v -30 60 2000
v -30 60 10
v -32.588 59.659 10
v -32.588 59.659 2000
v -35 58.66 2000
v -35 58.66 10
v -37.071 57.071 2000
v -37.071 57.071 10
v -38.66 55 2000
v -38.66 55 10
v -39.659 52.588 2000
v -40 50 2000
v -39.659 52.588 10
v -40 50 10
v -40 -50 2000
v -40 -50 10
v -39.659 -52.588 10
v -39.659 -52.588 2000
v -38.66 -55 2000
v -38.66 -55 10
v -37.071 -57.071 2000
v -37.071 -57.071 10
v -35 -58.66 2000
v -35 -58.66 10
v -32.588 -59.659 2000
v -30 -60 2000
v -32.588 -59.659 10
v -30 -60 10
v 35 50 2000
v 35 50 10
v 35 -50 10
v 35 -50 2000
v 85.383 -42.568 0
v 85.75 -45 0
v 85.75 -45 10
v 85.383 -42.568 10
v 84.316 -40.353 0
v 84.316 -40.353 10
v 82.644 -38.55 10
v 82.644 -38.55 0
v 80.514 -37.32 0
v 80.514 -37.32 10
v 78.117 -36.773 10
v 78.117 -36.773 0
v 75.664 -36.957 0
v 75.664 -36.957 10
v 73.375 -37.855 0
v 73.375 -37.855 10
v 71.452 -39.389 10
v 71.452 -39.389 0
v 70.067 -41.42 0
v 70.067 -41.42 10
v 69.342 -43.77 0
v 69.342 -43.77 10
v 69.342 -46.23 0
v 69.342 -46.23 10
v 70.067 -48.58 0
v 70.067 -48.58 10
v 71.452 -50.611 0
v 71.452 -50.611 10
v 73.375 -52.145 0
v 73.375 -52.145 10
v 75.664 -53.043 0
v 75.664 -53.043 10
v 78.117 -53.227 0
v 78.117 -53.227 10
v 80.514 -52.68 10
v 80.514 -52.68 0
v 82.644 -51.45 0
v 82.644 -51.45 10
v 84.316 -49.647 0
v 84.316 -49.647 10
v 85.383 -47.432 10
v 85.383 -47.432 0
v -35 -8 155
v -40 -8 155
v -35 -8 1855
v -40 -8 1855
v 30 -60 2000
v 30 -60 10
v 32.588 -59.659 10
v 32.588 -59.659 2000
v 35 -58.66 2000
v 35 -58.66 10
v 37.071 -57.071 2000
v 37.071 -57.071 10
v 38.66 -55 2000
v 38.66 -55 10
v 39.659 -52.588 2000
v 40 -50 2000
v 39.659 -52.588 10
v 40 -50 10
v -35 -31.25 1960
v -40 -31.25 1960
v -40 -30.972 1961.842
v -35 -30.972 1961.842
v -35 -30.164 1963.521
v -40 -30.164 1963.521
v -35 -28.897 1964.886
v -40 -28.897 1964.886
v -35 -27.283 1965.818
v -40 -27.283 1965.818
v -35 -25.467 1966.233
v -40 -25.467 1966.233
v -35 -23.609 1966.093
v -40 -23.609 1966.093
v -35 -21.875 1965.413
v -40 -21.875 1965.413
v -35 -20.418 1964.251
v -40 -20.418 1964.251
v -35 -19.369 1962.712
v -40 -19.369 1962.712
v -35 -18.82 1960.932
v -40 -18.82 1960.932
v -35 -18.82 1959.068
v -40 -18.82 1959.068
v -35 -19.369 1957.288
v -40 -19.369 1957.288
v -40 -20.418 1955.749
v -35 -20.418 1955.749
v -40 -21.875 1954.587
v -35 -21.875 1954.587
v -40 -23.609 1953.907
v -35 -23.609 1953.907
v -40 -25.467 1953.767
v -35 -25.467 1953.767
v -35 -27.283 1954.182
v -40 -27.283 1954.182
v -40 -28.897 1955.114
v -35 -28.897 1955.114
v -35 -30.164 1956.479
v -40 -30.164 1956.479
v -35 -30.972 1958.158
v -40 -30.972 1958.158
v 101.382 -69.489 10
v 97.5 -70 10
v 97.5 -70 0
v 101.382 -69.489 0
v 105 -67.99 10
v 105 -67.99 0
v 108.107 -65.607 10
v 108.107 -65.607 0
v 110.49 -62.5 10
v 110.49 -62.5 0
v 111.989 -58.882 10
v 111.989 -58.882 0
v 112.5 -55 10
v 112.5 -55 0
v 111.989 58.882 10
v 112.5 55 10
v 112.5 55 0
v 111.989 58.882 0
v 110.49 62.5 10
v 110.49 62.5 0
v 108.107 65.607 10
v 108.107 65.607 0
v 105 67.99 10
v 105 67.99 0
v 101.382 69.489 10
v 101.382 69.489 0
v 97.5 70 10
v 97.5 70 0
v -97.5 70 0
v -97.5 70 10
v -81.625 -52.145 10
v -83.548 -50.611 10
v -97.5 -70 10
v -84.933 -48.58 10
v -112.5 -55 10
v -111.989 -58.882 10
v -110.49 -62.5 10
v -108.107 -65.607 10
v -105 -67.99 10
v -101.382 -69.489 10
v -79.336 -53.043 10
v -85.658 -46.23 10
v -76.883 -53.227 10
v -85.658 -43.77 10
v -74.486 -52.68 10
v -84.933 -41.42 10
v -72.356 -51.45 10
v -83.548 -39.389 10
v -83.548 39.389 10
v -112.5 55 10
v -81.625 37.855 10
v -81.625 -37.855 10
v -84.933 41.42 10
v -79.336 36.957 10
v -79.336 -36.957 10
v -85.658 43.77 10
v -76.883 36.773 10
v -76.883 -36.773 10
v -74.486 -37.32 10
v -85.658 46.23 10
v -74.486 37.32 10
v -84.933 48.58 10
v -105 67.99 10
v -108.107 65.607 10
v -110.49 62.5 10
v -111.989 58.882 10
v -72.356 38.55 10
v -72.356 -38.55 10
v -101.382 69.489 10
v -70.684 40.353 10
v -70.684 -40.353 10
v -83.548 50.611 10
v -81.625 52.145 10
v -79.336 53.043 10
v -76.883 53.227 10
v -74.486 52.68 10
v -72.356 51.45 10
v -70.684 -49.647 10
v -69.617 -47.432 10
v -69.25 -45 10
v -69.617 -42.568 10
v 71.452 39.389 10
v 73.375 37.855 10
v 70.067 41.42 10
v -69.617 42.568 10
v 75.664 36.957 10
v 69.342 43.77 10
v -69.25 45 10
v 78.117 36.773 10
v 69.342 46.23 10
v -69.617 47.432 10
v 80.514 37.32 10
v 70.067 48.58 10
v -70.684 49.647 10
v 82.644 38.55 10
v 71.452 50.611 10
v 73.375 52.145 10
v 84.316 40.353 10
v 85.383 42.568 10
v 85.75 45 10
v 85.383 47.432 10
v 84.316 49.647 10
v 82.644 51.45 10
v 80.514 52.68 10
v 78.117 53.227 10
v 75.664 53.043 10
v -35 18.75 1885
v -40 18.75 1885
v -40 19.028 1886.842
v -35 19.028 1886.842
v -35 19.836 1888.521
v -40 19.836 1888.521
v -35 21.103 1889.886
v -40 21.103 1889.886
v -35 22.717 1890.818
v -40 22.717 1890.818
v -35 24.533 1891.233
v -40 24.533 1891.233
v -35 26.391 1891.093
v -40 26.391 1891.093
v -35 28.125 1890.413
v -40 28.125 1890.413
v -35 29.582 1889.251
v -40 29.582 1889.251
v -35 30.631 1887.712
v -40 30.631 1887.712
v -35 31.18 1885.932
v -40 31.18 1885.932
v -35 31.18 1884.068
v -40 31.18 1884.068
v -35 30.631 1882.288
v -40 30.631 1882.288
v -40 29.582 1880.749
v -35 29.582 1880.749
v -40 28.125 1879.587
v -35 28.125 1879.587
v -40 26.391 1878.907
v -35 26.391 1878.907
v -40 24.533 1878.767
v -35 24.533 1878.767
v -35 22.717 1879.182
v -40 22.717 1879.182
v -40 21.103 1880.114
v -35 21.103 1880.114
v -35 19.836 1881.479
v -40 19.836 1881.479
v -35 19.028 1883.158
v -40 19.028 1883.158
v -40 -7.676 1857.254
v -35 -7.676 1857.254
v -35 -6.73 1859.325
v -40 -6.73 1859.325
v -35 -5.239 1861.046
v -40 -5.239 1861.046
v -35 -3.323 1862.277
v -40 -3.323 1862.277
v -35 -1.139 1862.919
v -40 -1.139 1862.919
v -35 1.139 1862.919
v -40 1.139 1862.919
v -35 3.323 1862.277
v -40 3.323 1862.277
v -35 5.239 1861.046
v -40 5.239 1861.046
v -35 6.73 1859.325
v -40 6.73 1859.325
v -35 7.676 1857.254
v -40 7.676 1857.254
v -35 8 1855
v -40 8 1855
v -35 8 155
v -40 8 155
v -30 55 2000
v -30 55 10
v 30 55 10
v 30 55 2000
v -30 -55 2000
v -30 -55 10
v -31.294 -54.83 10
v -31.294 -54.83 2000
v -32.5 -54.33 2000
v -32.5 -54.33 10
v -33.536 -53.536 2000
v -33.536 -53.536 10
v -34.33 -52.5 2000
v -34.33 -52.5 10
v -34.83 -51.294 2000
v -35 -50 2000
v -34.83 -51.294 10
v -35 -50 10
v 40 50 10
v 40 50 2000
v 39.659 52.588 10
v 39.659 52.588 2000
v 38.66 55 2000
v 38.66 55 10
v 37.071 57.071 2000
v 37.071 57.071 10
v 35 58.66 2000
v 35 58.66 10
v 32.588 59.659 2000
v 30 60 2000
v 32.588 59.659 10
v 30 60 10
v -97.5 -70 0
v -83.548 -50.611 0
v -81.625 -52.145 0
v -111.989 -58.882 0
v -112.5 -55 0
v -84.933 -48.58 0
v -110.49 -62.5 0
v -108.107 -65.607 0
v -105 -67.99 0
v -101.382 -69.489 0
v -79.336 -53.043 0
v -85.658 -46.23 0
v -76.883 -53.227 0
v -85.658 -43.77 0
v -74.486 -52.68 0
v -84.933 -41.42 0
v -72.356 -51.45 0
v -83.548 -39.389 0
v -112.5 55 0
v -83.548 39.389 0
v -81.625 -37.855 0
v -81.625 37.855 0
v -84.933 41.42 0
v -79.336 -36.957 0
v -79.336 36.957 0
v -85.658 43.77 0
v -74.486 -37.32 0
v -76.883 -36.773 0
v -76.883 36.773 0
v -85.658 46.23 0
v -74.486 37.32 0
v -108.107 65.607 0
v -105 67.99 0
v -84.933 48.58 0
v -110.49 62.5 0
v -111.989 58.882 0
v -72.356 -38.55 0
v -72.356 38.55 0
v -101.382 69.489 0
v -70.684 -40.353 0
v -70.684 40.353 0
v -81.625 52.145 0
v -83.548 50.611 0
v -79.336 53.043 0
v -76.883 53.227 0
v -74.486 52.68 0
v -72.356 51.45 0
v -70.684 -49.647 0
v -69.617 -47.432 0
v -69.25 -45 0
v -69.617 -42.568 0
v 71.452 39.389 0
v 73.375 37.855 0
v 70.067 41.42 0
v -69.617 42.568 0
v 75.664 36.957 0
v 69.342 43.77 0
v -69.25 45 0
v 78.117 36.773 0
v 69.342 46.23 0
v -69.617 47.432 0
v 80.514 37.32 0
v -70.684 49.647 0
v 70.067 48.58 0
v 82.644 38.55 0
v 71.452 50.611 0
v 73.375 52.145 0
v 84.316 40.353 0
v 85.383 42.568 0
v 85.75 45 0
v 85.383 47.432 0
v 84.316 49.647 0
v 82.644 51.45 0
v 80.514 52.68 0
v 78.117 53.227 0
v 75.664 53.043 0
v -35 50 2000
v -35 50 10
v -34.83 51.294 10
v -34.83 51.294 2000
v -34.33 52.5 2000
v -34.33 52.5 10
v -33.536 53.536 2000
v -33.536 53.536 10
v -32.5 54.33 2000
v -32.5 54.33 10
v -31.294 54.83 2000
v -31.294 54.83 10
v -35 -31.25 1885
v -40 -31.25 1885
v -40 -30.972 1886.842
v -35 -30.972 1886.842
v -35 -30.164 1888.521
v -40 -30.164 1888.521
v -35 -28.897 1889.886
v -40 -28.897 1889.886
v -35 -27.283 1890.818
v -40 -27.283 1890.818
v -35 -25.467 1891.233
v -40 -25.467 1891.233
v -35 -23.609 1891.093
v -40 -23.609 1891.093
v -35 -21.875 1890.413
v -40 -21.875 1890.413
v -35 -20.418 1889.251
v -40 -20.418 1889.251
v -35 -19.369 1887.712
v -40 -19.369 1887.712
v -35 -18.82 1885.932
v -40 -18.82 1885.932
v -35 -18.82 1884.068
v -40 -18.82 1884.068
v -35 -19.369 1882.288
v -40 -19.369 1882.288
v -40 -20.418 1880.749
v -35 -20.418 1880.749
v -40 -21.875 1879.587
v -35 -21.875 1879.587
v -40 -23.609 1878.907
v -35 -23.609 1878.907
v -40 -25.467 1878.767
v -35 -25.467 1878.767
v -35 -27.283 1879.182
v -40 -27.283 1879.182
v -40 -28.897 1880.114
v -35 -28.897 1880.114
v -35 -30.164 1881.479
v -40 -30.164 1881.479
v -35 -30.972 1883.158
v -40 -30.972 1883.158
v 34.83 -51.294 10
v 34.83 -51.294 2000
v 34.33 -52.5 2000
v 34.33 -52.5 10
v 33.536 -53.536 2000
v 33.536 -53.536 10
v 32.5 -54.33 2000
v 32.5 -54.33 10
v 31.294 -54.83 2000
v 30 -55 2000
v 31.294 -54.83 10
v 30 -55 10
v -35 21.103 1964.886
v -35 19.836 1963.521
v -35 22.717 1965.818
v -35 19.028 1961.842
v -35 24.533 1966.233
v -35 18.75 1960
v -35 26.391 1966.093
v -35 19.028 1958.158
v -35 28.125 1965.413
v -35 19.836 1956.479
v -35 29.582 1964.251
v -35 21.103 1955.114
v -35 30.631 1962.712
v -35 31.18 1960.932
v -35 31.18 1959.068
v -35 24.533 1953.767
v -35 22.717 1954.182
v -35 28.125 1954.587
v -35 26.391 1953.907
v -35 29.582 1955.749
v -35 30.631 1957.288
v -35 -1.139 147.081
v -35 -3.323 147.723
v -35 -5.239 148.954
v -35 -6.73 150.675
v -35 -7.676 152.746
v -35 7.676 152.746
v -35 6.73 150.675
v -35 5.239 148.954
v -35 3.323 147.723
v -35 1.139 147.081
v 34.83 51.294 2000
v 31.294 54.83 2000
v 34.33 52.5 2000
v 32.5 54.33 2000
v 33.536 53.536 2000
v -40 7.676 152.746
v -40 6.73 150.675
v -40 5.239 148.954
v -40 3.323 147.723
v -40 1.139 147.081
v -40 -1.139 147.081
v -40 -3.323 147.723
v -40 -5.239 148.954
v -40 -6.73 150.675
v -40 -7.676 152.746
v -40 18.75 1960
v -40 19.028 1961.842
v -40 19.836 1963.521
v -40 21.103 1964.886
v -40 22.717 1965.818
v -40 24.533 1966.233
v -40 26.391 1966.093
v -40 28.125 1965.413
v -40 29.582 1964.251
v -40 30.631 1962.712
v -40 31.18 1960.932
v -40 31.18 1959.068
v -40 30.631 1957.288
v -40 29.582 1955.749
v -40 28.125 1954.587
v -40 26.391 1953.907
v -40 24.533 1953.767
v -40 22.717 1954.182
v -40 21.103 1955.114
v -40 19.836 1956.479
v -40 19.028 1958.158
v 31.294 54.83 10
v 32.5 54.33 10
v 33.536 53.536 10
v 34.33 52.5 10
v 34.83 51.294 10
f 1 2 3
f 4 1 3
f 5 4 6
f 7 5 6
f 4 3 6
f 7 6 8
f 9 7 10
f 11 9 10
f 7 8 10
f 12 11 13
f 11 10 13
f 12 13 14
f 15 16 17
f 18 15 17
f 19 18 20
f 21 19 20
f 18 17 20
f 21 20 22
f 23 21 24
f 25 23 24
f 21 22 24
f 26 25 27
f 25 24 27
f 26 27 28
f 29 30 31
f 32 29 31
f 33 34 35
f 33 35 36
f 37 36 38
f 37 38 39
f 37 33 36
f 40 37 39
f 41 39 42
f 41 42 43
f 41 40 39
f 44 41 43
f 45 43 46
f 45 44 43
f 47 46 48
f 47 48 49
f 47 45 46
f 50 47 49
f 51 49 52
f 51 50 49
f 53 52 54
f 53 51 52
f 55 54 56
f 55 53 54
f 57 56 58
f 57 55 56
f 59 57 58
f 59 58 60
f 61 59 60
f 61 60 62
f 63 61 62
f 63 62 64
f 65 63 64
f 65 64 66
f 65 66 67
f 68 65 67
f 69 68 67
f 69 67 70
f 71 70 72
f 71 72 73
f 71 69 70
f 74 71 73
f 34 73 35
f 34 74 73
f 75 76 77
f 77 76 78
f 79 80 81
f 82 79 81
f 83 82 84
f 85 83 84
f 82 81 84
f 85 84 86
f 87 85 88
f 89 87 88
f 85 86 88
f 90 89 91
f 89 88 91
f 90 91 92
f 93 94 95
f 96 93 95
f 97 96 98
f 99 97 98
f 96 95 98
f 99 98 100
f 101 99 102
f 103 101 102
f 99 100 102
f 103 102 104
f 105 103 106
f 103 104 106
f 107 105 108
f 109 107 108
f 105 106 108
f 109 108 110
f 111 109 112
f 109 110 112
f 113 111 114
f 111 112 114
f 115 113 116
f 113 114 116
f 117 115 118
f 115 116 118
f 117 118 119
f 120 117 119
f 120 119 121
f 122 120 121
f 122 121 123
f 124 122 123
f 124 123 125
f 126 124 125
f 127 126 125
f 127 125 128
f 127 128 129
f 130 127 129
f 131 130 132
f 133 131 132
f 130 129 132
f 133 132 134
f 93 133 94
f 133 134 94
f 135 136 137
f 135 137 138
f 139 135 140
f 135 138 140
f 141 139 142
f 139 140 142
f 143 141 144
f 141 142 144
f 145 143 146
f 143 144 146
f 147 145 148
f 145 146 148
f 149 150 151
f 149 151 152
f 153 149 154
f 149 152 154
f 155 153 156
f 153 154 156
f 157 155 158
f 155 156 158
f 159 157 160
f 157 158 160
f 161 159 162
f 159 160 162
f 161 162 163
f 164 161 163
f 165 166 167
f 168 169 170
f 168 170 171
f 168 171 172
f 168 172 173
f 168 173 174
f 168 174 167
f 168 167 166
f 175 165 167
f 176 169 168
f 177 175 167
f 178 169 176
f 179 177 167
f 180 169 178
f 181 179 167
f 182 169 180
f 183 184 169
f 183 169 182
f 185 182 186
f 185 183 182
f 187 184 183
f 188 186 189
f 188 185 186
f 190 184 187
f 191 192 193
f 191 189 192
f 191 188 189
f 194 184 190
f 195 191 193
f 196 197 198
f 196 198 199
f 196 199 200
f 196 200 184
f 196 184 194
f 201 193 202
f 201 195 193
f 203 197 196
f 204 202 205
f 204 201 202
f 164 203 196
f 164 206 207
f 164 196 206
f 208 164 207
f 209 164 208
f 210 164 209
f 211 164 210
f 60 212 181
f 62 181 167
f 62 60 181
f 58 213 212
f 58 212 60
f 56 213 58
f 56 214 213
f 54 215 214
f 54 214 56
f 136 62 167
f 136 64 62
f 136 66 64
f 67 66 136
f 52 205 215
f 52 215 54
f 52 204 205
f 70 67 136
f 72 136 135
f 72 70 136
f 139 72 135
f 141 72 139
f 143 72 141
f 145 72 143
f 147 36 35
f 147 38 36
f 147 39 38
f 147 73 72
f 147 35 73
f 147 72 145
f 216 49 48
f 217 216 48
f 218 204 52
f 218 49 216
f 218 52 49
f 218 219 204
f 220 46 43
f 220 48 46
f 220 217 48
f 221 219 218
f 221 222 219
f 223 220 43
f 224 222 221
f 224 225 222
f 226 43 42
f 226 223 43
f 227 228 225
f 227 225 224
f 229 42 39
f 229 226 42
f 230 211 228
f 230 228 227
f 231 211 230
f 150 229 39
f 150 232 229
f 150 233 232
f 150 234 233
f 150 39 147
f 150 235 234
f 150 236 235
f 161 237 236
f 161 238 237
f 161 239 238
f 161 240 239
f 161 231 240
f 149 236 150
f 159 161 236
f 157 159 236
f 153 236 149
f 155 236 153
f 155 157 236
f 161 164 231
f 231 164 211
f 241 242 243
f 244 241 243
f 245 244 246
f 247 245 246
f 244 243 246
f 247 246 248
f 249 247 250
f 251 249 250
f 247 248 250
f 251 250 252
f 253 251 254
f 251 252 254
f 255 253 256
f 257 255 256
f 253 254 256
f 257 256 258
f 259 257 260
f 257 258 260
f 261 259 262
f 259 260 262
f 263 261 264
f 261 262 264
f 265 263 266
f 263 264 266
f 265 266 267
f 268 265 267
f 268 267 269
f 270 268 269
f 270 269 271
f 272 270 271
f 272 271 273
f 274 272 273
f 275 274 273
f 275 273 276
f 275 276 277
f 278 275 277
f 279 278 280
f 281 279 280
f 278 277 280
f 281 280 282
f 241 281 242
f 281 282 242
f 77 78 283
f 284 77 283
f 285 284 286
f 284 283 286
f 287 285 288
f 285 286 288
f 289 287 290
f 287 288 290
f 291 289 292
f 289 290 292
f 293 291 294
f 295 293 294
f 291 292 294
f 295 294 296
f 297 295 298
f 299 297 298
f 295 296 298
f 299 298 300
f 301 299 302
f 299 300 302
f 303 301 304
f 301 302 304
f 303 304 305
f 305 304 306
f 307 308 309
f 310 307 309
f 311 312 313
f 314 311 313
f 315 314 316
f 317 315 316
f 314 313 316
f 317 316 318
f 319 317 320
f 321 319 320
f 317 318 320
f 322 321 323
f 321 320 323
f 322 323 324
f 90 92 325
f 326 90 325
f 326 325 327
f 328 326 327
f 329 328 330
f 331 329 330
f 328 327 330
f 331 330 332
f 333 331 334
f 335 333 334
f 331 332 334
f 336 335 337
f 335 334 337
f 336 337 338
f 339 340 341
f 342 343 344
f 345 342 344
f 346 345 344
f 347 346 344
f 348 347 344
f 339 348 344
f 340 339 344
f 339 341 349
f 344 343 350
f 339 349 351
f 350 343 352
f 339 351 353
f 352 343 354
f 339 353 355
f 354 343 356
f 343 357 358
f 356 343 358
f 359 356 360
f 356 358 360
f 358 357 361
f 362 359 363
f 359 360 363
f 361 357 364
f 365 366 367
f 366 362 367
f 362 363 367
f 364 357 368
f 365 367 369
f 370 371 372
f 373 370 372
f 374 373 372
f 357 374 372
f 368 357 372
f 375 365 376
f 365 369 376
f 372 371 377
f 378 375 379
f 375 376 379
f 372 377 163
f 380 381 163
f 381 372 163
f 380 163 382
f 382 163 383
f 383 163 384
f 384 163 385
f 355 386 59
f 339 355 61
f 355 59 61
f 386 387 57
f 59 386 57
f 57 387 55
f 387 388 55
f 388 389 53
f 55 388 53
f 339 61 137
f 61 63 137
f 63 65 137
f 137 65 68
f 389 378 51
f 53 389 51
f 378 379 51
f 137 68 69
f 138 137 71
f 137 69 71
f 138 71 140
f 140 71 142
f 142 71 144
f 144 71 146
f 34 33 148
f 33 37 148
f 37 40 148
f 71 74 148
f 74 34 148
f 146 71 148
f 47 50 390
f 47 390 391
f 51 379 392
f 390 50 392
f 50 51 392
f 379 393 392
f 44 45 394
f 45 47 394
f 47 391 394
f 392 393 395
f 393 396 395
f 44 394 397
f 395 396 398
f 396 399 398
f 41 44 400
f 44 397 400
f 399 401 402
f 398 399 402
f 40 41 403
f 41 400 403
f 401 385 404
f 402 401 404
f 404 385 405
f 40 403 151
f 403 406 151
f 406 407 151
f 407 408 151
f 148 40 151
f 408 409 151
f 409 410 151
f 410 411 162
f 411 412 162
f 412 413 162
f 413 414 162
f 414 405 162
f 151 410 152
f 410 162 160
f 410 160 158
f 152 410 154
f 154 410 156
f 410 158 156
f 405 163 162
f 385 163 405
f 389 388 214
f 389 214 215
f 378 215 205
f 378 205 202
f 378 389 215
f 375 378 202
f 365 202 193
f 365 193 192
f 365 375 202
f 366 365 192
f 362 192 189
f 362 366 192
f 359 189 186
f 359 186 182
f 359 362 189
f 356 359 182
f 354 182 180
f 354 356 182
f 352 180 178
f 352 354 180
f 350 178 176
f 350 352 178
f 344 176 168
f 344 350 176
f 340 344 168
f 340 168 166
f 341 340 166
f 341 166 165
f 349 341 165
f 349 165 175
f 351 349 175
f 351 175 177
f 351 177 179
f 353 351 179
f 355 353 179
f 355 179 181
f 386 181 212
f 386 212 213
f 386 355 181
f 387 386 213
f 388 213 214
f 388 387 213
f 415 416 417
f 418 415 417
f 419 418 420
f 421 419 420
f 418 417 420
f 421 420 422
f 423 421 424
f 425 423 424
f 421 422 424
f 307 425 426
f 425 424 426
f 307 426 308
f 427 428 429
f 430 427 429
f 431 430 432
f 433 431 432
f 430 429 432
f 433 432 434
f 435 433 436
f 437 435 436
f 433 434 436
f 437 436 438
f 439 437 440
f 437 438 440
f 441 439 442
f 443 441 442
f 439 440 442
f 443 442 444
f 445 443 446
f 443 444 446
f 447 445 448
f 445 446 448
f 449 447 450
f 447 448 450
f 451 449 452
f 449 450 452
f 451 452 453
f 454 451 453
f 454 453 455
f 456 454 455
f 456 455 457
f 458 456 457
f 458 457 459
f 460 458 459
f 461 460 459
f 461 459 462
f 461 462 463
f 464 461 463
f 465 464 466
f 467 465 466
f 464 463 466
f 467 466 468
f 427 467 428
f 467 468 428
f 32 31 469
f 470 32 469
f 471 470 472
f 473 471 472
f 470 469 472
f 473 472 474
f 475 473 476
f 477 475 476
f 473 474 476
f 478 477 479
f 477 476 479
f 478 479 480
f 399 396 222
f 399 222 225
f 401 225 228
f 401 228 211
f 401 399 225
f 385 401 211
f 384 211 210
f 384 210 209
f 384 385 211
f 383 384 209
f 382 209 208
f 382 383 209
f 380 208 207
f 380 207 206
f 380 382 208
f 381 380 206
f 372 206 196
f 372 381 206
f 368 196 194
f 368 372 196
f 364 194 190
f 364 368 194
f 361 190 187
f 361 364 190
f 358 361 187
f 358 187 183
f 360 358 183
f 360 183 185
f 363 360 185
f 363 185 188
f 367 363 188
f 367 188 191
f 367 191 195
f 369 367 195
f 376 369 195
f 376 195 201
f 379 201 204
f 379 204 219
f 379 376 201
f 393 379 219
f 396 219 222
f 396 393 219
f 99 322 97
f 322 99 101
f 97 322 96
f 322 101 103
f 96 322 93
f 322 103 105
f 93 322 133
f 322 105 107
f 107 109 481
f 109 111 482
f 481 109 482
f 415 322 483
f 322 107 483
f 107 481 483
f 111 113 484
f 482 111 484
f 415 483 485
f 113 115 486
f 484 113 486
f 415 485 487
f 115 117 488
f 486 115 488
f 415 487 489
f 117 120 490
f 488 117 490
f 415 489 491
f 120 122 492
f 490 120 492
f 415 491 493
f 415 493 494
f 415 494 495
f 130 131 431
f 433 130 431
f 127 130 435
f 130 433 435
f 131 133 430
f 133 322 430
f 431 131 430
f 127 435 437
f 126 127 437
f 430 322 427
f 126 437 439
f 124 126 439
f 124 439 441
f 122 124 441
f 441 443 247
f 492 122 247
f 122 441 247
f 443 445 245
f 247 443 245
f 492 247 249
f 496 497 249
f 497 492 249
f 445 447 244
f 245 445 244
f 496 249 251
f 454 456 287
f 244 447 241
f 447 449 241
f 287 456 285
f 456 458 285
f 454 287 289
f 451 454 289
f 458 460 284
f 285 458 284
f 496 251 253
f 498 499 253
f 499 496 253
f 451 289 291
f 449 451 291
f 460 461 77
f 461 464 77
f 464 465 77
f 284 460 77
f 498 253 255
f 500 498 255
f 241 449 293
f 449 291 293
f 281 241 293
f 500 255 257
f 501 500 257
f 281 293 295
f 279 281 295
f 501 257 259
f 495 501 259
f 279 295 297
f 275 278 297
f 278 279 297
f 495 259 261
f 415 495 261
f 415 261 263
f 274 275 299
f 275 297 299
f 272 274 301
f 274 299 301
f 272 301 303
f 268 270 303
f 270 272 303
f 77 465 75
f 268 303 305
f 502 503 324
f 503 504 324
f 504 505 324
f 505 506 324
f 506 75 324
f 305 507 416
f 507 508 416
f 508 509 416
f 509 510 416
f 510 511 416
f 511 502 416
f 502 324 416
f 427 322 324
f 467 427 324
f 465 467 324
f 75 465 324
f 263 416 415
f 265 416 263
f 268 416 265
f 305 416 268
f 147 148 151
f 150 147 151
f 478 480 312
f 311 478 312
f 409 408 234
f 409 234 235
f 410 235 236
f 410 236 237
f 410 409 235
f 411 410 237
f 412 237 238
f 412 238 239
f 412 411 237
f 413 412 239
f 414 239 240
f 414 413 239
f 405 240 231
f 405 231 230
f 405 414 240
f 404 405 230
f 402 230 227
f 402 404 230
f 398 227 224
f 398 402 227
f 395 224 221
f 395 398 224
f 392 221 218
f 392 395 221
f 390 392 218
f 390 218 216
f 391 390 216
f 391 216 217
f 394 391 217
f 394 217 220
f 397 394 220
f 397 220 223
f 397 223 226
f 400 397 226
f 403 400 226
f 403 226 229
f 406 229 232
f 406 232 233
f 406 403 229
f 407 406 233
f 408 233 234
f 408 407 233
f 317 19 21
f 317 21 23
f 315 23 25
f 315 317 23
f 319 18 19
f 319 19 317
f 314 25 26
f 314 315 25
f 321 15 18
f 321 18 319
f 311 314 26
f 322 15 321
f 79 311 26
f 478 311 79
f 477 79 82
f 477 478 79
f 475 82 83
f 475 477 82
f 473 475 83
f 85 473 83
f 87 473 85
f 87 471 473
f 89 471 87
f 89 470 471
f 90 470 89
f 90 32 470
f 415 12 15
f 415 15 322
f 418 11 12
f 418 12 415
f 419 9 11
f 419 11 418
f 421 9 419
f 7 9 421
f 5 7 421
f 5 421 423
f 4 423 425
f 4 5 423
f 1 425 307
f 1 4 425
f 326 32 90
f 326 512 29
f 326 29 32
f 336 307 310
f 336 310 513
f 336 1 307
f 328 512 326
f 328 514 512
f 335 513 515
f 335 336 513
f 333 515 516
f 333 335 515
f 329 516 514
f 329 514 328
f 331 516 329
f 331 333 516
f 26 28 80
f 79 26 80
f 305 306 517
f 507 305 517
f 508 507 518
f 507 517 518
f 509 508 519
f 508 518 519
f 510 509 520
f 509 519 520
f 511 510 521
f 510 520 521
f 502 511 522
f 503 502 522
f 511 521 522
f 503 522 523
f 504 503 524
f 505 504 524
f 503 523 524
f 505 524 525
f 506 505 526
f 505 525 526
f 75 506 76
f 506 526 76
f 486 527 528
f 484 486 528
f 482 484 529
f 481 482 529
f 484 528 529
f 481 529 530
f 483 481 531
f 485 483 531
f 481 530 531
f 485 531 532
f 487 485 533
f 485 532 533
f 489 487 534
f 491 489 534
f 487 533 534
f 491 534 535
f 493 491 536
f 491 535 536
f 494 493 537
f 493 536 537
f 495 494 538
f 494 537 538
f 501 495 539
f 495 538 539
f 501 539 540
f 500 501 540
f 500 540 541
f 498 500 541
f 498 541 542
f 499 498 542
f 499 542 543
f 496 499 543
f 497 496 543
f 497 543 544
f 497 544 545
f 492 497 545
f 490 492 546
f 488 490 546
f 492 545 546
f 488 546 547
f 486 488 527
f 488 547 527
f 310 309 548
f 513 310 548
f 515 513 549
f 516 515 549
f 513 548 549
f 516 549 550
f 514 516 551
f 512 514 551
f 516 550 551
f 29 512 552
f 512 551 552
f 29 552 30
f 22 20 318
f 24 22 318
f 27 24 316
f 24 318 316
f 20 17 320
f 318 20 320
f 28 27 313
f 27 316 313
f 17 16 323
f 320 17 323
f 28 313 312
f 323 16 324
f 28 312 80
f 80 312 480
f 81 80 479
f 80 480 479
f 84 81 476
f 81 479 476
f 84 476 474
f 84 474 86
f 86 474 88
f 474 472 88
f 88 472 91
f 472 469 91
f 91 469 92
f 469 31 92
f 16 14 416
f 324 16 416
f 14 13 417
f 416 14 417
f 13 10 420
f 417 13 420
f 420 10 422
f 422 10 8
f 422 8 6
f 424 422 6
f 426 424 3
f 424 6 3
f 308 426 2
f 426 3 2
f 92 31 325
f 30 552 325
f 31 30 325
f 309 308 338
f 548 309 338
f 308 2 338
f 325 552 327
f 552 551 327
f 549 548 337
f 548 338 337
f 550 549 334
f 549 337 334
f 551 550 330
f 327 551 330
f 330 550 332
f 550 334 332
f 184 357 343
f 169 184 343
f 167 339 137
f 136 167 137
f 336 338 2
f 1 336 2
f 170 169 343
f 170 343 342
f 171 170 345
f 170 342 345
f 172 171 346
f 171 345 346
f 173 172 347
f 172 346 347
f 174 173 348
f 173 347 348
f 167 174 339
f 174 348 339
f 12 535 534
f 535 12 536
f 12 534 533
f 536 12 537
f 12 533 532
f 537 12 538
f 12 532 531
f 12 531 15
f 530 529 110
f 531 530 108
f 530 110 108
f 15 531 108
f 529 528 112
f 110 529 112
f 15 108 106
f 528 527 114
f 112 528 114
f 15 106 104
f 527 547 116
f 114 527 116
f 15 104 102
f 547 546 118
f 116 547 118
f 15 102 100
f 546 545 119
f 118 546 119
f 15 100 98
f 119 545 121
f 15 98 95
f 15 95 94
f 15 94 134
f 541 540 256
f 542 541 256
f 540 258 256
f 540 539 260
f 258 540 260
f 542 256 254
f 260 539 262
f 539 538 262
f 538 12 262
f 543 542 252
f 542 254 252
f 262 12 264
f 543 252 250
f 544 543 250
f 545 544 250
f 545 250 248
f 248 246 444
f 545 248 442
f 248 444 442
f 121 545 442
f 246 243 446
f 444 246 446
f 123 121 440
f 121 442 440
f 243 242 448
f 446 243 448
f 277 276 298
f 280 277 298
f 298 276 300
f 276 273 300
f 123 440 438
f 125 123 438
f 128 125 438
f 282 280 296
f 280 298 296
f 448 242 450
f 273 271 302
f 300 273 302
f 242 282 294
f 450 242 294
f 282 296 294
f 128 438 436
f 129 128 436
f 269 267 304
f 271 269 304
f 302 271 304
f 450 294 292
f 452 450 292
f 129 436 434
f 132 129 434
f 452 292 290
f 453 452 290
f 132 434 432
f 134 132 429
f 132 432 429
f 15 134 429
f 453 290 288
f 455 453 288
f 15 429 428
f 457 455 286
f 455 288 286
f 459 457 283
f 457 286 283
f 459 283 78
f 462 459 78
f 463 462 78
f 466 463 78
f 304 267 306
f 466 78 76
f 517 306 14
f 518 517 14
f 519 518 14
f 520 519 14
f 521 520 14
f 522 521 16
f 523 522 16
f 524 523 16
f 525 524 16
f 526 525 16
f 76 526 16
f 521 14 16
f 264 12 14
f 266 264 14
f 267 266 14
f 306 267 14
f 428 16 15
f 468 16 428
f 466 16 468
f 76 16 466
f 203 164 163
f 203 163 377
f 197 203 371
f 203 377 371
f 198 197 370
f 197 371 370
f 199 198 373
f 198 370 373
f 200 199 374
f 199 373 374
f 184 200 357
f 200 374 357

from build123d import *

# Parameters (mm, degrees)
F0_R     = 8.25
F1_DEPTH = 10
F3_DEPTH = 1990
F4_R     = 6.25
F5_DEPTH = 5


with BuildPart() as f1:
    # F0 (on Top) → F1 (new body)
    with BuildSketch(Plane.XY):
        with BuildLine():
            ThreePointArc((112.5, 55), (108.106602, 65.606602), (97.5, 70))
            Line((97.5, 70), (-97.5, 70))
            ThreePointArc((-97.5, 70), (-108.106602, 65.606602), (-112.5, 55))
            Line((-112.5, 55), (-112.5, -55))
            ThreePointArc((-112.5, -55), (-108.106602, -65.606602), (-97.5, -70))
            Line((-97.5, -70), (97.5, -70))
            ThreePointArc((97.5, -70), (108.106602, -65.606602), (112.5, -55))
            Line((112.5, -55), (112.5, 55))
        make_face()
        with Locations((-77.5, -45)):
            Circle(F0_R, mode=Mode.SUBTRACT)
        with Locations((77.5, -45)):
            Circle(F0_R, mode=Mode.SUBTRACT)
        with Locations((-77.5, 45)):
            Circle(F0_R, mode=Mode.SUBTRACT)
        with Locations((77.5, 45)):
            Circle(F0_R, mode=Mode.SUBTRACT)
    extrude(amount=F1_DEPTH)


with BuildPart() as f3:
    # F2 (on face) → F3 (new body)
    with BuildSketch(Plane.XY.offset(10)):
        with BuildLine():
            ThreePointArc((40, 50), (37.071068, 57.071068), (30, 60))
            Line((30, 60), (-30, 60))
            ThreePointArc((-30, 60), (-37.071068, 57.071068), (-40, 50))
            Line((-40, 50), (-40, -50))
            ThreePointArc((-40, -50), (-37.071068, -57.071068), (-30, -60))
            Line((-30, -60), (30, -60))
            ThreePointArc((30, -60), (37.071068, -57.071068), (40, -50))
            Line((40, -50), (40, 50))
        make_face()
        with BuildLine():
            ThreePointArc((-35, 50), (-33.535534, 53.535534), (-30, 55))
            Line((-30, 55), (30, 55))
            ThreePointArc((30, 55), (33.535534, 53.535534), (35, 50))
            Line((35, 50), (35, -50))
            ThreePointArc((35, -50), (33.535534, -53.535534), (30, -55))
            Line((30, -55), (-30, -55))
            ThreePointArc((-30, -55), (-33.535534, -53.535534), (-35, -50))
            Line((-35, -50), (-35, 50))
        make_face(mode=Mode.SUBTRACT)
    extrude(amount=F3_DEPTH)

    # F4 (on face) → F5 (cut, through all)
    with BuildSketch(Plane(origin=(-40, 0, 0), x_dir=(0, -1, 0), z_dir=(-1, 0, 0))):
        with BuildLine():
            ThreePointArc((8, 1855), (0, 1863), (-8, 1855))
            Line((-8, 1855), (-8, 155))
            ThreePointArc((-8, 155), (0, 147), (8, 155))
            Line((8, 155), (8, 1855))
        make_face()
        with Locations((-25, 1960)):
            Circle(F4_R)
        with Locations((-25, 1885)):
            Circle(F4_R)
        with Locations((25, 1960)):
            Circle(F4_R)
        with Locations((25, 1885)):
            Circle(F4_R)
    extrude(amount=-F5_DEPTH, mode=Mode.SUBTRACT)


solid = Compound([f1.part, f3.part])
